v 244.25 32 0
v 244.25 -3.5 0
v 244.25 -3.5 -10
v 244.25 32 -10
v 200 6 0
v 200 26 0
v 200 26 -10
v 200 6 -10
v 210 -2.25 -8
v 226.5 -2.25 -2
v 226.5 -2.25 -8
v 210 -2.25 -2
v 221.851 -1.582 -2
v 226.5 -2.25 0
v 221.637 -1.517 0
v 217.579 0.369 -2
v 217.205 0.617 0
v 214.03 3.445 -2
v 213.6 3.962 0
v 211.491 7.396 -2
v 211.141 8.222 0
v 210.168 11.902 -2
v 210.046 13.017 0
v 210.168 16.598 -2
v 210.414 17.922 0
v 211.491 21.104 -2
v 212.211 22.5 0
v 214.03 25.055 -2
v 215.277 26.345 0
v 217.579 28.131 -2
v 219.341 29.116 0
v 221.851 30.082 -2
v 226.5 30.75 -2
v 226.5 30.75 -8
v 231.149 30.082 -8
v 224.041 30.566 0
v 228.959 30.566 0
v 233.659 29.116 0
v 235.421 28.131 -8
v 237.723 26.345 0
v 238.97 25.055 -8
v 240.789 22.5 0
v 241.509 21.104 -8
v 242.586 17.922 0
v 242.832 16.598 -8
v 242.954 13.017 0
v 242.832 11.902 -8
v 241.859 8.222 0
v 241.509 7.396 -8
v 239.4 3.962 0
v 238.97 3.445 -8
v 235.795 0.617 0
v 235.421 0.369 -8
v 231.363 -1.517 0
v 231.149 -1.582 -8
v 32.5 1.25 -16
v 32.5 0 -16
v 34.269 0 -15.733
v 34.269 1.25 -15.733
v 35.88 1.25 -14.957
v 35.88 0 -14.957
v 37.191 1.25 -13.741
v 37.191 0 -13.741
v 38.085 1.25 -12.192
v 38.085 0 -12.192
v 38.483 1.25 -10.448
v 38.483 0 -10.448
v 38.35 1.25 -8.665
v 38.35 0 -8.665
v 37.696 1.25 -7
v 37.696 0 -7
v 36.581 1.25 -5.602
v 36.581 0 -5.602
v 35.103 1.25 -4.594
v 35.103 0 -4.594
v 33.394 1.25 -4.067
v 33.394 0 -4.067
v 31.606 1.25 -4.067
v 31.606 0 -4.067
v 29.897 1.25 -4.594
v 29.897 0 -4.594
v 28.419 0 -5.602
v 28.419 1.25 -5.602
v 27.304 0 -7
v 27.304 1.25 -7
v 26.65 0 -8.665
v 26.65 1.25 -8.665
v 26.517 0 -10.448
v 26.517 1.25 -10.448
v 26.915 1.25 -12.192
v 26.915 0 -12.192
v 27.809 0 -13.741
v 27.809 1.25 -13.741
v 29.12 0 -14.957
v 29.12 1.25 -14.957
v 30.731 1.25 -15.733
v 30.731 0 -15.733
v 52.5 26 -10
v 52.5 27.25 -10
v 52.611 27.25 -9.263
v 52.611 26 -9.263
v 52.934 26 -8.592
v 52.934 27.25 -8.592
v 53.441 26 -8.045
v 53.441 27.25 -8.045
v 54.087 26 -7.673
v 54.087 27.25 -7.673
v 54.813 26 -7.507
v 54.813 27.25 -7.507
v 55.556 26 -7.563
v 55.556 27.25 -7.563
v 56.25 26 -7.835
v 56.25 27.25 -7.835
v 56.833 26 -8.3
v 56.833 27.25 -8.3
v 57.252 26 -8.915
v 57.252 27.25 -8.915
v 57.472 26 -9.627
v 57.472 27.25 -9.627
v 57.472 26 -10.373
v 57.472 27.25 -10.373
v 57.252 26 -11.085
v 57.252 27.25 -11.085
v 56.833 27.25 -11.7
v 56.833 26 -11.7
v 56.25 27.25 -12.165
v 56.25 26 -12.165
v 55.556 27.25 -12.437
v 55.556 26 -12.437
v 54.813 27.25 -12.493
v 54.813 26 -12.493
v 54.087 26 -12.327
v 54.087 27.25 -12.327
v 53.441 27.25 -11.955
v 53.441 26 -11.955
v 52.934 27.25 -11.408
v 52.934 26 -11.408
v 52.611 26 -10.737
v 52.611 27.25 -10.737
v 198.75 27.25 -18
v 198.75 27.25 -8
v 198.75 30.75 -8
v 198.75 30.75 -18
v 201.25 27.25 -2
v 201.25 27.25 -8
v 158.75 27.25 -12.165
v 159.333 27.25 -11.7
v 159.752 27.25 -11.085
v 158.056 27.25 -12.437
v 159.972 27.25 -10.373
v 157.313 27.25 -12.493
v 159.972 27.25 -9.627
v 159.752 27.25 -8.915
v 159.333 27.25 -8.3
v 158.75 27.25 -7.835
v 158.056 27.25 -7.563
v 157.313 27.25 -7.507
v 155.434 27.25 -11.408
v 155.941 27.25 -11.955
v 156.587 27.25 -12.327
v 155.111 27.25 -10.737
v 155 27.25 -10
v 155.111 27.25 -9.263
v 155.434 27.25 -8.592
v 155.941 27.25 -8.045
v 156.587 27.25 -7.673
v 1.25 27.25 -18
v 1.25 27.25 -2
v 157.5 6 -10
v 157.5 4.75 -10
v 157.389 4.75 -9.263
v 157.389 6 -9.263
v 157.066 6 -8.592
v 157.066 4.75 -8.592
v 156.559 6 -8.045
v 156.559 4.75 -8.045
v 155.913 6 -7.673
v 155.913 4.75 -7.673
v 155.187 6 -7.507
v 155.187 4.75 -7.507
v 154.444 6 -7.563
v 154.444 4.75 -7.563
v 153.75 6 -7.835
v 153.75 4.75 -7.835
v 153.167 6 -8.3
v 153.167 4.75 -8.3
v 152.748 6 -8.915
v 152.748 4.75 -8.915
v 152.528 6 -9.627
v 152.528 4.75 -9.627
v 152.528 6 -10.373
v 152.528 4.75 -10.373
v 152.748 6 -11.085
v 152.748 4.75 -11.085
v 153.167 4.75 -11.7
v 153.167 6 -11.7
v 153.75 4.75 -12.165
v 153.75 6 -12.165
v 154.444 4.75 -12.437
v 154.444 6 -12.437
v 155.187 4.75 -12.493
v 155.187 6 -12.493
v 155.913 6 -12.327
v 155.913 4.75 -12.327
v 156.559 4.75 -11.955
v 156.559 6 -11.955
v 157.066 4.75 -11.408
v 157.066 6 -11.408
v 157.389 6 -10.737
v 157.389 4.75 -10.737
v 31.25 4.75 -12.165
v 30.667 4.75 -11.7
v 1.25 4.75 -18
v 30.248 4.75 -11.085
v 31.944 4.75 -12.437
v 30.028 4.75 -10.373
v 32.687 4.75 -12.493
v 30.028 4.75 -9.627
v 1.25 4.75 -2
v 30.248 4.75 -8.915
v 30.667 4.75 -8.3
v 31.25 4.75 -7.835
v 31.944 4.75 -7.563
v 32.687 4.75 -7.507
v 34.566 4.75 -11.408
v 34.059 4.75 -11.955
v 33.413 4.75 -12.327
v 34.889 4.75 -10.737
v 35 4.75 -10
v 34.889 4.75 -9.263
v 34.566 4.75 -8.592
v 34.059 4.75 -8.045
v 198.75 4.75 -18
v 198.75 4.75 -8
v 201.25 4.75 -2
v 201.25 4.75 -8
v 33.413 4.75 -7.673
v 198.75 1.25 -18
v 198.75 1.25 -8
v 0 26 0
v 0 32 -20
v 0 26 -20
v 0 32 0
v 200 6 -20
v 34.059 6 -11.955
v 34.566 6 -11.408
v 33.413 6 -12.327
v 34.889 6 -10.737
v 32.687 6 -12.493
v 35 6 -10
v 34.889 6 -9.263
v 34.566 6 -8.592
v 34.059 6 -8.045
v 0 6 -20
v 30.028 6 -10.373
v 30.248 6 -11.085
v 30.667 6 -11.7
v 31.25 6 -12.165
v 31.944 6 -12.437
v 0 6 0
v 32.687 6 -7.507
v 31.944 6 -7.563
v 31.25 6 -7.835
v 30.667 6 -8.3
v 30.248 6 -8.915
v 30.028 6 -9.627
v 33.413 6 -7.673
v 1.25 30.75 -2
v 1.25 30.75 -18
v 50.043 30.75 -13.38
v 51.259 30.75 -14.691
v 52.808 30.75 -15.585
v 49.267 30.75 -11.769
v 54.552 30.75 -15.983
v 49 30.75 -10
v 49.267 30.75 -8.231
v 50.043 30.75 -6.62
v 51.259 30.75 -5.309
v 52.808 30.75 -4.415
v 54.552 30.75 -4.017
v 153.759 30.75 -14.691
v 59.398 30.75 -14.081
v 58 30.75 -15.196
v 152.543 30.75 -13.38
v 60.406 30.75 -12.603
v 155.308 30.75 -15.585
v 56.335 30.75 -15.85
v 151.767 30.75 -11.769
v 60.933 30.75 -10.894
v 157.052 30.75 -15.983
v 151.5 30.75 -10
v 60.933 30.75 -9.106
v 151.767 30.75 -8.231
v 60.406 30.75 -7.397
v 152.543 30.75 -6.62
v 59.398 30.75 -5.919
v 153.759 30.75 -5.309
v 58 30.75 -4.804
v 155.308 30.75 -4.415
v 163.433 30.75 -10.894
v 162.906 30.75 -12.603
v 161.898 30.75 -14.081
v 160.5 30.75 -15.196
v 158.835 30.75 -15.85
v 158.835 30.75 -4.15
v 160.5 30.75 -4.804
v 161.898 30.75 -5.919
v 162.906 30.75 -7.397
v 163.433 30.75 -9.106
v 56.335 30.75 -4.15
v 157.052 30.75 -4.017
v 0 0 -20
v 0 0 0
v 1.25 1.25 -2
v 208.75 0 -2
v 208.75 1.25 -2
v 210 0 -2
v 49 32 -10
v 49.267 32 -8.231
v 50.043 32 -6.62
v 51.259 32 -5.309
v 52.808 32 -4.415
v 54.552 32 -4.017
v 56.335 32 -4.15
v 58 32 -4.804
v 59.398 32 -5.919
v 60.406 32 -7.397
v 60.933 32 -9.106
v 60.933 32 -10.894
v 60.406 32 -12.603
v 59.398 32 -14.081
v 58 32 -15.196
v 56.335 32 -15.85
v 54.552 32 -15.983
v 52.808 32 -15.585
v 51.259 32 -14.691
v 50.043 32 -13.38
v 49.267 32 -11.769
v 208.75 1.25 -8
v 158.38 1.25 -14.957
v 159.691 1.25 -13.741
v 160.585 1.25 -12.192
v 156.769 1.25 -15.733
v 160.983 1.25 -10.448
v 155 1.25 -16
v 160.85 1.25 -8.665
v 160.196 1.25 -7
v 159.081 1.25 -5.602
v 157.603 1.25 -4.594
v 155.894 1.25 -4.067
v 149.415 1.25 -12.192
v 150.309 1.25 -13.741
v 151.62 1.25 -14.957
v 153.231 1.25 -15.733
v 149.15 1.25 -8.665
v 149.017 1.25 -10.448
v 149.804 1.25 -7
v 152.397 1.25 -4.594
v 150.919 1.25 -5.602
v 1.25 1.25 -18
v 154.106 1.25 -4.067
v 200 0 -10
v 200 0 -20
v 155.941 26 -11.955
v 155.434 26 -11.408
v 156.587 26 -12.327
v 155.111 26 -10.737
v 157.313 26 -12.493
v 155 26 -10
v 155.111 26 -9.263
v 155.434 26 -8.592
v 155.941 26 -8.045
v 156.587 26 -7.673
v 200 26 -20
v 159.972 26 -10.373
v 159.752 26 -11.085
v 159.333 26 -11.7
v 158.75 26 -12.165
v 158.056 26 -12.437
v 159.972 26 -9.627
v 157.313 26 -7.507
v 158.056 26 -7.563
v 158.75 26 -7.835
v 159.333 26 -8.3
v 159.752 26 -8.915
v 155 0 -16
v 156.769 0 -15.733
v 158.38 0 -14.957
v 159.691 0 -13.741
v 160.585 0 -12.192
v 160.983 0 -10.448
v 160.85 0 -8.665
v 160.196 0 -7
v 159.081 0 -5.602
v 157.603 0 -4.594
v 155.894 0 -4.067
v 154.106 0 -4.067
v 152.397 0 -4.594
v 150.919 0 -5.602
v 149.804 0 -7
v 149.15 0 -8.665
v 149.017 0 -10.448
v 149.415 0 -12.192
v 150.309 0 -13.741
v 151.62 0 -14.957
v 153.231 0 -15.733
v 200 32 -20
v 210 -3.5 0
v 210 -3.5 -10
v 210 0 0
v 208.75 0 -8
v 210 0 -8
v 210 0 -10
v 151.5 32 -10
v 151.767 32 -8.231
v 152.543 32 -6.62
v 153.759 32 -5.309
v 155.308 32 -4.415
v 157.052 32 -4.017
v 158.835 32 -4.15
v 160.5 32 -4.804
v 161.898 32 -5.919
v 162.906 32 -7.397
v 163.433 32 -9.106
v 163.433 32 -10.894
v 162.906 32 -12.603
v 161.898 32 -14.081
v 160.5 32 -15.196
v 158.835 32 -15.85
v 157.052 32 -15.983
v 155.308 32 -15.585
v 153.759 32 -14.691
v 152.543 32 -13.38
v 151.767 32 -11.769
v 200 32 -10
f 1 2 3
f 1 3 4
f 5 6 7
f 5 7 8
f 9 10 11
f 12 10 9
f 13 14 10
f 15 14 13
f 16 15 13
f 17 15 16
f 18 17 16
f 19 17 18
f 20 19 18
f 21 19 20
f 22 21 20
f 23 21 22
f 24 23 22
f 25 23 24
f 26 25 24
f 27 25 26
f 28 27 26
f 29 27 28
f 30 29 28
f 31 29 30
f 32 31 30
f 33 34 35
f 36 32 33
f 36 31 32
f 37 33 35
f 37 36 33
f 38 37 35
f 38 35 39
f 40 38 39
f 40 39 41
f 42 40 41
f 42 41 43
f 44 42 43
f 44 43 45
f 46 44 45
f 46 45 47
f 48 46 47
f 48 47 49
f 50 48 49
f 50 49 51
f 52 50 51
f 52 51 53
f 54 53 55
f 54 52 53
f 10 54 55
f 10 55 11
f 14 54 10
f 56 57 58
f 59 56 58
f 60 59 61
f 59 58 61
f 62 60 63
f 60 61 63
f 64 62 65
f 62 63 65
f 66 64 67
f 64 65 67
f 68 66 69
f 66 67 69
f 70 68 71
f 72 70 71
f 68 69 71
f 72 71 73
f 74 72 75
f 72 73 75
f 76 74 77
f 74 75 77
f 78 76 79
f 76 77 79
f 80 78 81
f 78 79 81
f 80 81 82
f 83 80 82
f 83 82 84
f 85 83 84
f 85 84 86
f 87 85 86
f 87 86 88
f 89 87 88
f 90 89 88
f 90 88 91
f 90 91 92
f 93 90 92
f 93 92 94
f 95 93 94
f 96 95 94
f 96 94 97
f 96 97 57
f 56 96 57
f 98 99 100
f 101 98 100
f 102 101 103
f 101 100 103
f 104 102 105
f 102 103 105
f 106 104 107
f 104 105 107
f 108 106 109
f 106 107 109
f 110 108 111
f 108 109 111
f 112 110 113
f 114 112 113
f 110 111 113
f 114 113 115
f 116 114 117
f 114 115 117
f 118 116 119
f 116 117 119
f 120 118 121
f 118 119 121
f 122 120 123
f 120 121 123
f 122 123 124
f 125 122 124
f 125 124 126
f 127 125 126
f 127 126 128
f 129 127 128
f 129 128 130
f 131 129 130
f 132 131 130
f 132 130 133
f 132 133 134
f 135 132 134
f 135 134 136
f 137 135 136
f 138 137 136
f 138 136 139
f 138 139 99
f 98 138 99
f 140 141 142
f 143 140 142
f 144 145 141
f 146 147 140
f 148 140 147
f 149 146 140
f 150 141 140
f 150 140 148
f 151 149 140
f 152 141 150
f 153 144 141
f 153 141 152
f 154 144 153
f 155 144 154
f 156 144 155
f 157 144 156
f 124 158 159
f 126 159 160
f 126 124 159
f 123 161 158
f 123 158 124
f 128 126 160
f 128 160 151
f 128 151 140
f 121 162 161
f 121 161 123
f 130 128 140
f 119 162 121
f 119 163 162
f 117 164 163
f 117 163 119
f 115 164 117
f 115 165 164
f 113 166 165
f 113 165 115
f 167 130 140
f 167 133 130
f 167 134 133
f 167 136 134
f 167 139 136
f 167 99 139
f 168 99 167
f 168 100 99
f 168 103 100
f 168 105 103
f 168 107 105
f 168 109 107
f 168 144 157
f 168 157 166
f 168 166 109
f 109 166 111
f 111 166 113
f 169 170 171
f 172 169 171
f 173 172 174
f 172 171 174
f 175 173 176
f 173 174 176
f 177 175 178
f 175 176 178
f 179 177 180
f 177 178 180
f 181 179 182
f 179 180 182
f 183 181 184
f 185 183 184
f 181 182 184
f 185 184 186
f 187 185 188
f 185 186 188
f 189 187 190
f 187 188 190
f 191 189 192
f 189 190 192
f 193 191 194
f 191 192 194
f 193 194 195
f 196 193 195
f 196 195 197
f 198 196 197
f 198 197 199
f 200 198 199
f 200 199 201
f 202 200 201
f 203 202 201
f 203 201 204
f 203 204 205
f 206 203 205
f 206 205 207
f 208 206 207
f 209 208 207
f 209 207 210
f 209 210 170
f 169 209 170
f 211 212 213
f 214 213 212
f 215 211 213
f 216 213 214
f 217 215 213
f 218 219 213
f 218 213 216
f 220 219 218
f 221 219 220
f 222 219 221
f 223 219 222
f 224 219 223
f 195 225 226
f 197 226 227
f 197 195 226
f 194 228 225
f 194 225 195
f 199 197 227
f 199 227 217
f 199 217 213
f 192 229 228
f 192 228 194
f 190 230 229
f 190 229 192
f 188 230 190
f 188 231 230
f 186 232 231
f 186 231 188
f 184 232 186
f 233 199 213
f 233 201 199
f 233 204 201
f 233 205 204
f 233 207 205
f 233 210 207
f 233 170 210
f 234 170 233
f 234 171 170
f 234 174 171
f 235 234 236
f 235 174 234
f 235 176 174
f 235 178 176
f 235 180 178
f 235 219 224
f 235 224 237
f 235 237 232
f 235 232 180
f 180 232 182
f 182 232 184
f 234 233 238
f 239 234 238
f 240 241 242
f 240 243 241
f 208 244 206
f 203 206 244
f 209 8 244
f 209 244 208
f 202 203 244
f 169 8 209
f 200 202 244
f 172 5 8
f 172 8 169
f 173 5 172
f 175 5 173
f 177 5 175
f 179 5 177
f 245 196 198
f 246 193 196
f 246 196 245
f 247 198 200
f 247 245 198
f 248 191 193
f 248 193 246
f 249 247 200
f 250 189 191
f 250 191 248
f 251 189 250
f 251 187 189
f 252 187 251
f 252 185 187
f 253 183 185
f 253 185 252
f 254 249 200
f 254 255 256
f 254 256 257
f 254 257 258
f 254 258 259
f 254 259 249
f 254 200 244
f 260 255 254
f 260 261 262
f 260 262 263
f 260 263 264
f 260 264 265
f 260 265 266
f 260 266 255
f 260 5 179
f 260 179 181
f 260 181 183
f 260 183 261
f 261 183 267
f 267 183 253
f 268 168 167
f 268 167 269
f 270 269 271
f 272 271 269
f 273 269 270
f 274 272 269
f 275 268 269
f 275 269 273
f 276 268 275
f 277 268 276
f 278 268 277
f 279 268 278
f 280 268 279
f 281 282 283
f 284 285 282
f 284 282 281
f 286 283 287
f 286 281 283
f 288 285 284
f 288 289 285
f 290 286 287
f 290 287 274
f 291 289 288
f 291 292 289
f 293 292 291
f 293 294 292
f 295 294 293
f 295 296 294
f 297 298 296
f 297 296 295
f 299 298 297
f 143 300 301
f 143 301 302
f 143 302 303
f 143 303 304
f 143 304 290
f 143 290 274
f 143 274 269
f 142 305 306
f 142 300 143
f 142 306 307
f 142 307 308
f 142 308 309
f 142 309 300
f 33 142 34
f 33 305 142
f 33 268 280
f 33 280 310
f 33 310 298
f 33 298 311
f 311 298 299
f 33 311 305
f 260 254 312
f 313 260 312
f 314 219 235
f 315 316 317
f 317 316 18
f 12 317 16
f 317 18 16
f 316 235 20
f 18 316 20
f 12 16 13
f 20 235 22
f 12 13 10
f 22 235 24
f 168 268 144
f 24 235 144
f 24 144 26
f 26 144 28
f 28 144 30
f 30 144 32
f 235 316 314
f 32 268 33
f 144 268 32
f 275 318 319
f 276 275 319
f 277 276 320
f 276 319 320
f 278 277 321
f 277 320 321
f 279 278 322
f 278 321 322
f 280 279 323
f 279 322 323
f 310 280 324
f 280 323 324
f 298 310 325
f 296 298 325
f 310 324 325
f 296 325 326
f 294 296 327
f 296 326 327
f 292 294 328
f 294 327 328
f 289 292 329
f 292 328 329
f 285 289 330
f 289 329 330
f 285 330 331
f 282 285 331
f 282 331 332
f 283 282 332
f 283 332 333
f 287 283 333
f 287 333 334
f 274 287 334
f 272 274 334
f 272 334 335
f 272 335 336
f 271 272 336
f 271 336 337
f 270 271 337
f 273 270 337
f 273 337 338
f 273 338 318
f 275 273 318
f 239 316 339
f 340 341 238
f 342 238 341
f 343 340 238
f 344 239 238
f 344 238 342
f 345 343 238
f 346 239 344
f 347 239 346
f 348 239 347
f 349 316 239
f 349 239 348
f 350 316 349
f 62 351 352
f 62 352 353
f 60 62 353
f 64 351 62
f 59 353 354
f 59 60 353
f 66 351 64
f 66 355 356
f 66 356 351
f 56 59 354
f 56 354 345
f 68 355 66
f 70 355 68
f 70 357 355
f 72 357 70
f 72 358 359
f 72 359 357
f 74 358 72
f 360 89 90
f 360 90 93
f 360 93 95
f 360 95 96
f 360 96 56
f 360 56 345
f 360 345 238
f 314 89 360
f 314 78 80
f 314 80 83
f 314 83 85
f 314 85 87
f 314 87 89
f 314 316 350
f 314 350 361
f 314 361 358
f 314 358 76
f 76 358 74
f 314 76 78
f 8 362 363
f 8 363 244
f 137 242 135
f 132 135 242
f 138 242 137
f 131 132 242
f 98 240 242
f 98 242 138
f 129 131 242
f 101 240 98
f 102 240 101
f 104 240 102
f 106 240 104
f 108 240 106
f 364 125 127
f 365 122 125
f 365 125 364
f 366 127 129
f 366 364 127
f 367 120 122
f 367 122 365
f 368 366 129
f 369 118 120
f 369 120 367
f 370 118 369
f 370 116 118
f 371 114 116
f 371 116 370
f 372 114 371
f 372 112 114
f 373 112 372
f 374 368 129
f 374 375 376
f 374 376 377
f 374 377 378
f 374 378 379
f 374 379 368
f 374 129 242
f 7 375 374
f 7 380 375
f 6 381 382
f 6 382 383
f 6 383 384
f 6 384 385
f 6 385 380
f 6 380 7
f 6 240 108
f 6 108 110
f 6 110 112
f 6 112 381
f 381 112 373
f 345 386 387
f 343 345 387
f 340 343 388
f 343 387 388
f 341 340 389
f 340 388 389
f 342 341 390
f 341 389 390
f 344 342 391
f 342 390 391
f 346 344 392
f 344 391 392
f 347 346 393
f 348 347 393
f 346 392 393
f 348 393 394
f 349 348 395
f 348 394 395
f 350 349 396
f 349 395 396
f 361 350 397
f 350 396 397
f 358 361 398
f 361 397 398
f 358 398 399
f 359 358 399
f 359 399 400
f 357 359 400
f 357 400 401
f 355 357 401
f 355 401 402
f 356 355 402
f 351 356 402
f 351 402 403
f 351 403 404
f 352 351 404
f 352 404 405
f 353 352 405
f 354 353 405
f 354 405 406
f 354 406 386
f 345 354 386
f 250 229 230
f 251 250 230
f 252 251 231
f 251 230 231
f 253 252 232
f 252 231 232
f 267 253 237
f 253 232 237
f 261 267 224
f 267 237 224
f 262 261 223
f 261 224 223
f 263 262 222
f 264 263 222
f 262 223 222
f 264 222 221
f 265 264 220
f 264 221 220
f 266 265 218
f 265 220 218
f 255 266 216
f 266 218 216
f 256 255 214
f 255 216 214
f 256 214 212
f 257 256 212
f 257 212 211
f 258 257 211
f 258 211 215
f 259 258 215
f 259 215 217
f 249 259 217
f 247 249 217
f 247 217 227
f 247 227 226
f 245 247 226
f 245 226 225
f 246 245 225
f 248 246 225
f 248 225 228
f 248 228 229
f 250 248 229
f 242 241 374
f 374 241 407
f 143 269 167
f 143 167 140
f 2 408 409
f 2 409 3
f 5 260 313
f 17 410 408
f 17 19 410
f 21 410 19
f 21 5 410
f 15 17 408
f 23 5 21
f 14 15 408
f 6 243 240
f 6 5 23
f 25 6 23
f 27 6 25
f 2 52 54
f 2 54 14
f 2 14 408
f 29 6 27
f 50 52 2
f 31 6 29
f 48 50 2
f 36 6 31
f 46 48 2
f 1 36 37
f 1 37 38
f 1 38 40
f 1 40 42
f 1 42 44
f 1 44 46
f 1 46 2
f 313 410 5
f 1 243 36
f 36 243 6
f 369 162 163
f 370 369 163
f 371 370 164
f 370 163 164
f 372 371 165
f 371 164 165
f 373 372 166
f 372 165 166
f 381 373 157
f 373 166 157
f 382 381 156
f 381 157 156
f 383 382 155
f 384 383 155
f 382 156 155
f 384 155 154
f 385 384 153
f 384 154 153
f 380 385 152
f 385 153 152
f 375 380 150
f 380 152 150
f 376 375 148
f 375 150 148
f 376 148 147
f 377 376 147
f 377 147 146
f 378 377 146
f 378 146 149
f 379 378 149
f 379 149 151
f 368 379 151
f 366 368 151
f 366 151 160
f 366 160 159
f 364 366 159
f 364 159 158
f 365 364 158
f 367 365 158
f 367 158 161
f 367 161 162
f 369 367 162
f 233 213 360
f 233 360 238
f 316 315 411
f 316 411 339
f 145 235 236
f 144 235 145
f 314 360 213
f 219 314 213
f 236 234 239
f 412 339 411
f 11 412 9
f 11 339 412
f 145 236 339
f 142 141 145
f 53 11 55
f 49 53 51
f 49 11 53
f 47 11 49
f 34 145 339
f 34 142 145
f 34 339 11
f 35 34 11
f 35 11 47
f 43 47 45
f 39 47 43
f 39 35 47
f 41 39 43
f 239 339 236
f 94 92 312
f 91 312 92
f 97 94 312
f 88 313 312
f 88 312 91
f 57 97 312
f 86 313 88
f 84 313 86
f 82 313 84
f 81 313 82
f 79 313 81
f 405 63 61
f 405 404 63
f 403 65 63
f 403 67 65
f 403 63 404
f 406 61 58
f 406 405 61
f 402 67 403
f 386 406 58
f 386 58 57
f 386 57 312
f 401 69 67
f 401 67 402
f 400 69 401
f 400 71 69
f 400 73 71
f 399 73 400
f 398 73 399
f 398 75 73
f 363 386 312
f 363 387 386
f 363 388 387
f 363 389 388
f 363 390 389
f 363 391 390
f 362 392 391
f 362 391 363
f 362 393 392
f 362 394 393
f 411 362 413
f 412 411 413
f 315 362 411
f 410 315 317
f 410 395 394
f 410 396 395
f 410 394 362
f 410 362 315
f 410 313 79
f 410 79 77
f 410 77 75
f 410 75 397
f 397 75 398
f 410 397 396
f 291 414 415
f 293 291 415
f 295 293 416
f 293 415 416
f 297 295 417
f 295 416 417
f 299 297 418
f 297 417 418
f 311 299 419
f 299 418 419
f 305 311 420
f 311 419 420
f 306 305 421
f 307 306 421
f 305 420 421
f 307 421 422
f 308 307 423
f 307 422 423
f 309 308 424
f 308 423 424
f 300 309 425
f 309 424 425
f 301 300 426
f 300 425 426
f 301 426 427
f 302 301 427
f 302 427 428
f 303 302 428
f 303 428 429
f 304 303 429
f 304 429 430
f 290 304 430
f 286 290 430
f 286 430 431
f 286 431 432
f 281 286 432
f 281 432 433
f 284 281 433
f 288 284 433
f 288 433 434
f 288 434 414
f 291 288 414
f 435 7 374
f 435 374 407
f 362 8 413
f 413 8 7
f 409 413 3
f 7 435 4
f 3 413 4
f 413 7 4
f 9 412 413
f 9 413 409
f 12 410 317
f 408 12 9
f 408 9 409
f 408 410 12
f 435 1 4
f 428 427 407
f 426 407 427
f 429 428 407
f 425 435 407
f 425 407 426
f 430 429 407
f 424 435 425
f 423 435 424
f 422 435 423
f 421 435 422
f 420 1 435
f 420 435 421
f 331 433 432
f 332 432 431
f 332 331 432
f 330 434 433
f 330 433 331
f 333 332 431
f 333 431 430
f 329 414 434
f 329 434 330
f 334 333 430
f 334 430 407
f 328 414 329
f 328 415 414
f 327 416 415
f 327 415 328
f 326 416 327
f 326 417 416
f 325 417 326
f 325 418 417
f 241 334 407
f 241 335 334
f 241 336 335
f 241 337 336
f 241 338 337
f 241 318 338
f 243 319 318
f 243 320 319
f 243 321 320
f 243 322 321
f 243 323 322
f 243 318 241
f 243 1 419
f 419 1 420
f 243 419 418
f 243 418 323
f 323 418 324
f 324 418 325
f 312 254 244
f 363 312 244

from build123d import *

# Parameters (mm, degrees)
BOSS_EXTRUDE11_DEPTH = 10
BOSS_EXTRUDE12_DEPTH = 2
BOSS_EXTRUDE15_START = -8
BOSS_EXTRUDE15_DEPTH = 2
BOSS_EXTRUDE19_START = -10
SKETCH1_20_W         = 1.25
SKETCH1_20_H         = 3.5
BOSS_EXTRUDE19_DEPTH = 10
BOSS_EXTRUDE20_START = -20
SKETCH1_21_W         = 197.5
SKETCH1_21_H         = 3.5
BOSS_EXTRUDE20_DEPTH = 2
CUT_EXTRUDE1_REACH   = 249.148
SKETCH2_R            = 2.5
SKETCH2_3_R          = 6
SKETCH2_3_R_2        = 2.5
CUT_EXTRUDE2_DEPTH   = 4.75
CUT_EXTRUDE3_REACH   = 249.625
SKETCH3_R            = 2.5
SKETCH3_3_R          = 6
SKETCH3_3_R_2        = 2.5
CUT_EXTRUDE4_DEPTH   = 4.75


with BuildPart() as part:
    # Sketch1 → Boss-Extrude11 (new body)
    with BuildSketch(Plane.XY):
        with BuildLine():
            Line((201.25, 4.75), (201.25, 27.25))
            Line((201.25, 27.25), (1.25, 27.25))
            Line((1.25, 27.25), (1.25, 30.75))
            Line((1.25, 30.75), (226.5, 30.75))
            ThreePointArc((226.5, 30.75), (243, 14.25), (226.5, -2.25))
            Line((226.5, -2.25), (210, -2.25))
            Line((210, -2.25), (210, -3.5))
            Line((210, -3.5), (244.25, -3.5))
            Line((244.25, -3.5), (244.25, 32))
            Line((244.25, 32), (0, 32))
            Line((0, 32), (0, 26))
            Line((0, 26), (200, 26))
            Line((200, 26), (200, 6))
            Line((200, 6), (0, 6))
            Line((0, 6), (0, 0))
            Line((0, 0), (208.75, 0))
            Line((208.75, 0), (208.75, 1.25))
            Line((208.75, 1.25), (1.25, 1.25))
            Line((1.25, 1.25), (1.25, 4.75))
            Line((1.25, 4.75), (201.25, 4.75))
        make_face()
    extrude(amount=-BOSS_EXTRUDE11_DEPTH)

    # Sketch1<12> → Boss-Extrude12 (add)
    with BuildSketch(Plane.XY):
        with BuildLine():
            Line((201.25, 4.75), (1.25, 4.75))
            Line((1.25, 4.75), (1.25, 1.25))
            Line((1.25, 1.25), (208.75, 1.25))
            Line((208.75, 1.25), (208.75, 0))
            Line((208.75, 0), (210, 0))
            Line((210, 0), (210, -2.25))
            Line((210, -2.25), (226.5, -2.25))
            ThreePointArc((226.5, -2.25), (210, 14.25), (226.5, 30.75))
            Line((226.5, 30.75), (1.25, 30.75))
            Line((1.25, 30.75), (1.25, 27.25))
            Line((1.25, 27.25), (201.25, 27.25))
            Line((201.25, 27.25), (201.25, 4.75))
        make_face()
    extrude(amount=-BOSS_EXTRUDE12_DEPTH)

    # Sketch1<14> → Boss-Extrude15 (add)
    with BuildSketch(Plane.XY.offset(BOSS_EXTRUDE15_START)):
        with BuildLine():
            Line((201.25, 4.75), (198.75, 4.75))
            Line((198.75, 4.75), (198.75, 1.25))
            Line((198.75, 1.25), (208.75, 1.25))
            Line((208.75, 1.25), (208.75, 0))
            Line((208.75, 0), (210, 0))
            Line((210, 0), (210, -2.25))
            Line((210, -2.25), (226.5, -2.25))
            ThreePointArc((226.5, -2.25), (243, 14.25), (226.5, 30.75))
            Line((226.5, 30.75), (198.75, 30.75))
            Line((198.75, 30.75), (198.75, 27.25))
            Line((198.75, 27.25), (201.25, 27.25))
            Line((201.25, 27.25), (201.25, 4.75))
        make_face()
    extrude(amount=-BOSS_EXTRUDE15_DEPTH)

    # Sketch1<20> → Boss-Extrude19 (add)
    with BuildSketch(Plane.XY.offset(BOSS_EXTRUDE19_START)):
        Polygon((0, 26), (200, 26), (200, 27.25), (198.75, 27.25), (1.25, 27.25), (1.25, 30.75), (198.75, 30.75), (200, 30.75), (200, 32), (0, 32), align=None)
        with Locations((199.375, 29)):
            Rectangle(SKETCH1_20_W, SKETCH1_20_H)
        with Locations((199.375, 3)):
            Rectangle(SKETCH1_20_W, SKETCH1_20_H)
        Polygon((200, 4.75), (200, 6), (0, 6), (0, 0), (200, 0), (200, 1.25), (198.75, 1.25), (1.25, 1.25), (1.25, 4.75), (198.75, 4.75), align=None)
    extrude(amount=-BOSS_EXTRUDE19_DEPTH)

    # Sketch1<21> → Boss-Extrude20 (add)
    with BuildSketch(Plane.XY.offset(BOSS_EXTRUDE20_START)):
        with Locations((100, 3)):
            Rectangle(SKETCH1_21_W, SKETCH1_21_H)
        with Locations((100, 29)):
            Rectangle(SKETCH1_21_W, SKETCH1_21_H)
    extrude(amount=BOSS_EXTRUDE20_DEPTH)

    # Cut-Extrude1: up to this face of the body (flat: up to its plane)
    cut_extrude1_end = Plane(part.part.faces().sort_by_distance((100, 6, -10))[0])
    # Sketch2 → Cut-Extrude1 (cut, up to the picked face)
    with BuildSketch(Plane.XZ, mode=Mode.PRIVATE) as cut_extrude1_sk1:
        with Locations((32.5, -10)):
            Circle(SKETCH2_R)
    cut_extrude1_tool1 = split(extrude(cut_extrude1_sk1.sketch, amount=-CUT_EXTRUDE1_REACH, mode=Mode.PRIVATE), bisect_by=cut_extrude1_end, keep=Keep.BOTH, mode=Mode.PRIVATE)
    # Sketch2 → Cut-Extrude1 (cut, up to the picked face)
    with BuildSketch(Plane.XZ, mode=Mode.PRIVATE) as cut_extrude1_sk2:
        with Locations((155, -10)):
            Circle(SKETCH2_R)
    cut_extrude1_tool2 = split(extrude(cut_extrude1_sk2.sketch, amount=-CUT_EXTRUDE1_REACH, mode=Mode.PRIVATE), bisect_by=cut_extrude1_end, keep=Keep.BOTH, mode=Mode.PRIVATE)
    add(cut_extrude1_tool1.solids().sort_by(Axis((32.5, 0, -10), (0, 1, 0)))[0], mode=Mode.SUBTRACT)
    add(cut_extrude1_tool2.solids().sort_by(Axis((155, 0, -10), (0, 1, 0)))[0], mode=Mode.SUBTRACT)

    # Sketch2<3> → Cut-Extrude2 (cut)
    # profile 1 of 2: a face of its own
    with BuildSketch(Plane.XZ):
        with Locations(Location((155, -10, 0), (0, 0, 270))):
            Circle(SKETCH2_3_R)
        with Locations((155, -10)):
            Circle(SKETCH2_3_R_2, mode=Mode.SUBTRACT)
    # profile 2 of 2: a face of its own
    with BuildSketch(Plane.XZ):
        with Locations(Location((32.5, -10, 0), (0, 0, 270))):
            Circle(SKETCH2_3_R)
        with Locations((32.5, -10)):
            Circle(SKETCH2_3_R_2, mode=Mode.SUBTRACT)
    extrude(amount=-CUT_EXTRUDE2_DEPTH, mode=Mode.SUBTRACT)

    # Cut-Extrude3: up to this face of the body (flat: up to its plane)
    cut_extrude3_end = Plane(part.part.faces().sort_by_distance((100, 26, -10))[0])
    # Sketch3 → Cut-Extrude3 (cut, up to the picked face)
    with BuildSketch(Plane(origin=(0, 32, 0), x_dir=(1, 0, 0), z_dir=(0, 1, 0)), mode=Mode.PRIVATE) as cut_extrude3_sk1:
        with Locations(Location((157.5, 10, 0), (0, 0, 180))):
            Circle(SKETCH3_R)
    cut_extrude3_tool1 = split(extrude(cut_extrude3_sk1.sketch, amount=-CUT_EXTRUDE3_REACH, mode=Mode.PRIVATE), bisect_by=cut_extrude3_end, keep=Keep.BOTH, mode=Mode.PRIVATE)
    # Sketch3 → Cut-Extrude3 (cut, up to the picked face)
    with BuildSketch(Plane(origin=(0, 32, 0), x_dir=(1, 0, 0), z_dir=(0, 1, 0)), mode=Mode.PRIVATE) as cut_extrude3_sk2:
        with Locations(Location((55, 10, 0), (0, 0, 180))):
            Circle(SKETCH3_R)
    cut_extrude3_tool2 = split(extrude(cut_extrude3_sk2.sketch, amount=-CUT_EXTRUDE3_REACH, mode=Mode.PRIVATE), bisect_by=cut_extrude3_end, keep=Keep.BOTH, mode=Mode.PRIVATE)
    add(cut_extrude3_tool1.solids().sort_by(Axis((157.5, 32, -10), (0, -1, 0)))[0], mode=Mode.SUBTRACT)
    add(cut_extrude3_tool2.solids().sort_by(Axis((55, 32, -10), (0, -1, 0)))[0], mode=Mode.SUBTRACT)

    # Sketch3<3> → Cut-Extrude4 (cut)
    # profile 1 of 2: a face of its own
    with BuildSketch(Plane(origin=(0, 32, 0), x_dir=(1, 0, 0), z_dir=(0, 1, 0))):
        with Locations(Location((157.5, 10, 0), (0, 0, 180))):
            Circle(SKETCH3_3_R)
        with Locations(Location((157.5, 10, 0), (0, 0, 180))):
            Circle(SKETCH3_3_R_2, mode=Mode.SUBTRACT)
    # profile 2 of 2: a face of its own
    with BuildSketch(Plane(origin=(0, 32, 0), x_dir=(1, 0, 0), z_dir=(0, 1, 0))):
        with Locations(Location((55, 10, 0), (0, 0, 180))):
            Circle(SKETCH3_3_R)
        with Locations(Location((55, 10, 0), (0, 0, 180))):
            Circle(SKETCH3_3_R_2, mode=Mode.SUBTRACT)
    extrude(amount=-CUT_EXTRUDE4_DEPTH, mode=Mode.SUBTRACT)


solid = part.part
